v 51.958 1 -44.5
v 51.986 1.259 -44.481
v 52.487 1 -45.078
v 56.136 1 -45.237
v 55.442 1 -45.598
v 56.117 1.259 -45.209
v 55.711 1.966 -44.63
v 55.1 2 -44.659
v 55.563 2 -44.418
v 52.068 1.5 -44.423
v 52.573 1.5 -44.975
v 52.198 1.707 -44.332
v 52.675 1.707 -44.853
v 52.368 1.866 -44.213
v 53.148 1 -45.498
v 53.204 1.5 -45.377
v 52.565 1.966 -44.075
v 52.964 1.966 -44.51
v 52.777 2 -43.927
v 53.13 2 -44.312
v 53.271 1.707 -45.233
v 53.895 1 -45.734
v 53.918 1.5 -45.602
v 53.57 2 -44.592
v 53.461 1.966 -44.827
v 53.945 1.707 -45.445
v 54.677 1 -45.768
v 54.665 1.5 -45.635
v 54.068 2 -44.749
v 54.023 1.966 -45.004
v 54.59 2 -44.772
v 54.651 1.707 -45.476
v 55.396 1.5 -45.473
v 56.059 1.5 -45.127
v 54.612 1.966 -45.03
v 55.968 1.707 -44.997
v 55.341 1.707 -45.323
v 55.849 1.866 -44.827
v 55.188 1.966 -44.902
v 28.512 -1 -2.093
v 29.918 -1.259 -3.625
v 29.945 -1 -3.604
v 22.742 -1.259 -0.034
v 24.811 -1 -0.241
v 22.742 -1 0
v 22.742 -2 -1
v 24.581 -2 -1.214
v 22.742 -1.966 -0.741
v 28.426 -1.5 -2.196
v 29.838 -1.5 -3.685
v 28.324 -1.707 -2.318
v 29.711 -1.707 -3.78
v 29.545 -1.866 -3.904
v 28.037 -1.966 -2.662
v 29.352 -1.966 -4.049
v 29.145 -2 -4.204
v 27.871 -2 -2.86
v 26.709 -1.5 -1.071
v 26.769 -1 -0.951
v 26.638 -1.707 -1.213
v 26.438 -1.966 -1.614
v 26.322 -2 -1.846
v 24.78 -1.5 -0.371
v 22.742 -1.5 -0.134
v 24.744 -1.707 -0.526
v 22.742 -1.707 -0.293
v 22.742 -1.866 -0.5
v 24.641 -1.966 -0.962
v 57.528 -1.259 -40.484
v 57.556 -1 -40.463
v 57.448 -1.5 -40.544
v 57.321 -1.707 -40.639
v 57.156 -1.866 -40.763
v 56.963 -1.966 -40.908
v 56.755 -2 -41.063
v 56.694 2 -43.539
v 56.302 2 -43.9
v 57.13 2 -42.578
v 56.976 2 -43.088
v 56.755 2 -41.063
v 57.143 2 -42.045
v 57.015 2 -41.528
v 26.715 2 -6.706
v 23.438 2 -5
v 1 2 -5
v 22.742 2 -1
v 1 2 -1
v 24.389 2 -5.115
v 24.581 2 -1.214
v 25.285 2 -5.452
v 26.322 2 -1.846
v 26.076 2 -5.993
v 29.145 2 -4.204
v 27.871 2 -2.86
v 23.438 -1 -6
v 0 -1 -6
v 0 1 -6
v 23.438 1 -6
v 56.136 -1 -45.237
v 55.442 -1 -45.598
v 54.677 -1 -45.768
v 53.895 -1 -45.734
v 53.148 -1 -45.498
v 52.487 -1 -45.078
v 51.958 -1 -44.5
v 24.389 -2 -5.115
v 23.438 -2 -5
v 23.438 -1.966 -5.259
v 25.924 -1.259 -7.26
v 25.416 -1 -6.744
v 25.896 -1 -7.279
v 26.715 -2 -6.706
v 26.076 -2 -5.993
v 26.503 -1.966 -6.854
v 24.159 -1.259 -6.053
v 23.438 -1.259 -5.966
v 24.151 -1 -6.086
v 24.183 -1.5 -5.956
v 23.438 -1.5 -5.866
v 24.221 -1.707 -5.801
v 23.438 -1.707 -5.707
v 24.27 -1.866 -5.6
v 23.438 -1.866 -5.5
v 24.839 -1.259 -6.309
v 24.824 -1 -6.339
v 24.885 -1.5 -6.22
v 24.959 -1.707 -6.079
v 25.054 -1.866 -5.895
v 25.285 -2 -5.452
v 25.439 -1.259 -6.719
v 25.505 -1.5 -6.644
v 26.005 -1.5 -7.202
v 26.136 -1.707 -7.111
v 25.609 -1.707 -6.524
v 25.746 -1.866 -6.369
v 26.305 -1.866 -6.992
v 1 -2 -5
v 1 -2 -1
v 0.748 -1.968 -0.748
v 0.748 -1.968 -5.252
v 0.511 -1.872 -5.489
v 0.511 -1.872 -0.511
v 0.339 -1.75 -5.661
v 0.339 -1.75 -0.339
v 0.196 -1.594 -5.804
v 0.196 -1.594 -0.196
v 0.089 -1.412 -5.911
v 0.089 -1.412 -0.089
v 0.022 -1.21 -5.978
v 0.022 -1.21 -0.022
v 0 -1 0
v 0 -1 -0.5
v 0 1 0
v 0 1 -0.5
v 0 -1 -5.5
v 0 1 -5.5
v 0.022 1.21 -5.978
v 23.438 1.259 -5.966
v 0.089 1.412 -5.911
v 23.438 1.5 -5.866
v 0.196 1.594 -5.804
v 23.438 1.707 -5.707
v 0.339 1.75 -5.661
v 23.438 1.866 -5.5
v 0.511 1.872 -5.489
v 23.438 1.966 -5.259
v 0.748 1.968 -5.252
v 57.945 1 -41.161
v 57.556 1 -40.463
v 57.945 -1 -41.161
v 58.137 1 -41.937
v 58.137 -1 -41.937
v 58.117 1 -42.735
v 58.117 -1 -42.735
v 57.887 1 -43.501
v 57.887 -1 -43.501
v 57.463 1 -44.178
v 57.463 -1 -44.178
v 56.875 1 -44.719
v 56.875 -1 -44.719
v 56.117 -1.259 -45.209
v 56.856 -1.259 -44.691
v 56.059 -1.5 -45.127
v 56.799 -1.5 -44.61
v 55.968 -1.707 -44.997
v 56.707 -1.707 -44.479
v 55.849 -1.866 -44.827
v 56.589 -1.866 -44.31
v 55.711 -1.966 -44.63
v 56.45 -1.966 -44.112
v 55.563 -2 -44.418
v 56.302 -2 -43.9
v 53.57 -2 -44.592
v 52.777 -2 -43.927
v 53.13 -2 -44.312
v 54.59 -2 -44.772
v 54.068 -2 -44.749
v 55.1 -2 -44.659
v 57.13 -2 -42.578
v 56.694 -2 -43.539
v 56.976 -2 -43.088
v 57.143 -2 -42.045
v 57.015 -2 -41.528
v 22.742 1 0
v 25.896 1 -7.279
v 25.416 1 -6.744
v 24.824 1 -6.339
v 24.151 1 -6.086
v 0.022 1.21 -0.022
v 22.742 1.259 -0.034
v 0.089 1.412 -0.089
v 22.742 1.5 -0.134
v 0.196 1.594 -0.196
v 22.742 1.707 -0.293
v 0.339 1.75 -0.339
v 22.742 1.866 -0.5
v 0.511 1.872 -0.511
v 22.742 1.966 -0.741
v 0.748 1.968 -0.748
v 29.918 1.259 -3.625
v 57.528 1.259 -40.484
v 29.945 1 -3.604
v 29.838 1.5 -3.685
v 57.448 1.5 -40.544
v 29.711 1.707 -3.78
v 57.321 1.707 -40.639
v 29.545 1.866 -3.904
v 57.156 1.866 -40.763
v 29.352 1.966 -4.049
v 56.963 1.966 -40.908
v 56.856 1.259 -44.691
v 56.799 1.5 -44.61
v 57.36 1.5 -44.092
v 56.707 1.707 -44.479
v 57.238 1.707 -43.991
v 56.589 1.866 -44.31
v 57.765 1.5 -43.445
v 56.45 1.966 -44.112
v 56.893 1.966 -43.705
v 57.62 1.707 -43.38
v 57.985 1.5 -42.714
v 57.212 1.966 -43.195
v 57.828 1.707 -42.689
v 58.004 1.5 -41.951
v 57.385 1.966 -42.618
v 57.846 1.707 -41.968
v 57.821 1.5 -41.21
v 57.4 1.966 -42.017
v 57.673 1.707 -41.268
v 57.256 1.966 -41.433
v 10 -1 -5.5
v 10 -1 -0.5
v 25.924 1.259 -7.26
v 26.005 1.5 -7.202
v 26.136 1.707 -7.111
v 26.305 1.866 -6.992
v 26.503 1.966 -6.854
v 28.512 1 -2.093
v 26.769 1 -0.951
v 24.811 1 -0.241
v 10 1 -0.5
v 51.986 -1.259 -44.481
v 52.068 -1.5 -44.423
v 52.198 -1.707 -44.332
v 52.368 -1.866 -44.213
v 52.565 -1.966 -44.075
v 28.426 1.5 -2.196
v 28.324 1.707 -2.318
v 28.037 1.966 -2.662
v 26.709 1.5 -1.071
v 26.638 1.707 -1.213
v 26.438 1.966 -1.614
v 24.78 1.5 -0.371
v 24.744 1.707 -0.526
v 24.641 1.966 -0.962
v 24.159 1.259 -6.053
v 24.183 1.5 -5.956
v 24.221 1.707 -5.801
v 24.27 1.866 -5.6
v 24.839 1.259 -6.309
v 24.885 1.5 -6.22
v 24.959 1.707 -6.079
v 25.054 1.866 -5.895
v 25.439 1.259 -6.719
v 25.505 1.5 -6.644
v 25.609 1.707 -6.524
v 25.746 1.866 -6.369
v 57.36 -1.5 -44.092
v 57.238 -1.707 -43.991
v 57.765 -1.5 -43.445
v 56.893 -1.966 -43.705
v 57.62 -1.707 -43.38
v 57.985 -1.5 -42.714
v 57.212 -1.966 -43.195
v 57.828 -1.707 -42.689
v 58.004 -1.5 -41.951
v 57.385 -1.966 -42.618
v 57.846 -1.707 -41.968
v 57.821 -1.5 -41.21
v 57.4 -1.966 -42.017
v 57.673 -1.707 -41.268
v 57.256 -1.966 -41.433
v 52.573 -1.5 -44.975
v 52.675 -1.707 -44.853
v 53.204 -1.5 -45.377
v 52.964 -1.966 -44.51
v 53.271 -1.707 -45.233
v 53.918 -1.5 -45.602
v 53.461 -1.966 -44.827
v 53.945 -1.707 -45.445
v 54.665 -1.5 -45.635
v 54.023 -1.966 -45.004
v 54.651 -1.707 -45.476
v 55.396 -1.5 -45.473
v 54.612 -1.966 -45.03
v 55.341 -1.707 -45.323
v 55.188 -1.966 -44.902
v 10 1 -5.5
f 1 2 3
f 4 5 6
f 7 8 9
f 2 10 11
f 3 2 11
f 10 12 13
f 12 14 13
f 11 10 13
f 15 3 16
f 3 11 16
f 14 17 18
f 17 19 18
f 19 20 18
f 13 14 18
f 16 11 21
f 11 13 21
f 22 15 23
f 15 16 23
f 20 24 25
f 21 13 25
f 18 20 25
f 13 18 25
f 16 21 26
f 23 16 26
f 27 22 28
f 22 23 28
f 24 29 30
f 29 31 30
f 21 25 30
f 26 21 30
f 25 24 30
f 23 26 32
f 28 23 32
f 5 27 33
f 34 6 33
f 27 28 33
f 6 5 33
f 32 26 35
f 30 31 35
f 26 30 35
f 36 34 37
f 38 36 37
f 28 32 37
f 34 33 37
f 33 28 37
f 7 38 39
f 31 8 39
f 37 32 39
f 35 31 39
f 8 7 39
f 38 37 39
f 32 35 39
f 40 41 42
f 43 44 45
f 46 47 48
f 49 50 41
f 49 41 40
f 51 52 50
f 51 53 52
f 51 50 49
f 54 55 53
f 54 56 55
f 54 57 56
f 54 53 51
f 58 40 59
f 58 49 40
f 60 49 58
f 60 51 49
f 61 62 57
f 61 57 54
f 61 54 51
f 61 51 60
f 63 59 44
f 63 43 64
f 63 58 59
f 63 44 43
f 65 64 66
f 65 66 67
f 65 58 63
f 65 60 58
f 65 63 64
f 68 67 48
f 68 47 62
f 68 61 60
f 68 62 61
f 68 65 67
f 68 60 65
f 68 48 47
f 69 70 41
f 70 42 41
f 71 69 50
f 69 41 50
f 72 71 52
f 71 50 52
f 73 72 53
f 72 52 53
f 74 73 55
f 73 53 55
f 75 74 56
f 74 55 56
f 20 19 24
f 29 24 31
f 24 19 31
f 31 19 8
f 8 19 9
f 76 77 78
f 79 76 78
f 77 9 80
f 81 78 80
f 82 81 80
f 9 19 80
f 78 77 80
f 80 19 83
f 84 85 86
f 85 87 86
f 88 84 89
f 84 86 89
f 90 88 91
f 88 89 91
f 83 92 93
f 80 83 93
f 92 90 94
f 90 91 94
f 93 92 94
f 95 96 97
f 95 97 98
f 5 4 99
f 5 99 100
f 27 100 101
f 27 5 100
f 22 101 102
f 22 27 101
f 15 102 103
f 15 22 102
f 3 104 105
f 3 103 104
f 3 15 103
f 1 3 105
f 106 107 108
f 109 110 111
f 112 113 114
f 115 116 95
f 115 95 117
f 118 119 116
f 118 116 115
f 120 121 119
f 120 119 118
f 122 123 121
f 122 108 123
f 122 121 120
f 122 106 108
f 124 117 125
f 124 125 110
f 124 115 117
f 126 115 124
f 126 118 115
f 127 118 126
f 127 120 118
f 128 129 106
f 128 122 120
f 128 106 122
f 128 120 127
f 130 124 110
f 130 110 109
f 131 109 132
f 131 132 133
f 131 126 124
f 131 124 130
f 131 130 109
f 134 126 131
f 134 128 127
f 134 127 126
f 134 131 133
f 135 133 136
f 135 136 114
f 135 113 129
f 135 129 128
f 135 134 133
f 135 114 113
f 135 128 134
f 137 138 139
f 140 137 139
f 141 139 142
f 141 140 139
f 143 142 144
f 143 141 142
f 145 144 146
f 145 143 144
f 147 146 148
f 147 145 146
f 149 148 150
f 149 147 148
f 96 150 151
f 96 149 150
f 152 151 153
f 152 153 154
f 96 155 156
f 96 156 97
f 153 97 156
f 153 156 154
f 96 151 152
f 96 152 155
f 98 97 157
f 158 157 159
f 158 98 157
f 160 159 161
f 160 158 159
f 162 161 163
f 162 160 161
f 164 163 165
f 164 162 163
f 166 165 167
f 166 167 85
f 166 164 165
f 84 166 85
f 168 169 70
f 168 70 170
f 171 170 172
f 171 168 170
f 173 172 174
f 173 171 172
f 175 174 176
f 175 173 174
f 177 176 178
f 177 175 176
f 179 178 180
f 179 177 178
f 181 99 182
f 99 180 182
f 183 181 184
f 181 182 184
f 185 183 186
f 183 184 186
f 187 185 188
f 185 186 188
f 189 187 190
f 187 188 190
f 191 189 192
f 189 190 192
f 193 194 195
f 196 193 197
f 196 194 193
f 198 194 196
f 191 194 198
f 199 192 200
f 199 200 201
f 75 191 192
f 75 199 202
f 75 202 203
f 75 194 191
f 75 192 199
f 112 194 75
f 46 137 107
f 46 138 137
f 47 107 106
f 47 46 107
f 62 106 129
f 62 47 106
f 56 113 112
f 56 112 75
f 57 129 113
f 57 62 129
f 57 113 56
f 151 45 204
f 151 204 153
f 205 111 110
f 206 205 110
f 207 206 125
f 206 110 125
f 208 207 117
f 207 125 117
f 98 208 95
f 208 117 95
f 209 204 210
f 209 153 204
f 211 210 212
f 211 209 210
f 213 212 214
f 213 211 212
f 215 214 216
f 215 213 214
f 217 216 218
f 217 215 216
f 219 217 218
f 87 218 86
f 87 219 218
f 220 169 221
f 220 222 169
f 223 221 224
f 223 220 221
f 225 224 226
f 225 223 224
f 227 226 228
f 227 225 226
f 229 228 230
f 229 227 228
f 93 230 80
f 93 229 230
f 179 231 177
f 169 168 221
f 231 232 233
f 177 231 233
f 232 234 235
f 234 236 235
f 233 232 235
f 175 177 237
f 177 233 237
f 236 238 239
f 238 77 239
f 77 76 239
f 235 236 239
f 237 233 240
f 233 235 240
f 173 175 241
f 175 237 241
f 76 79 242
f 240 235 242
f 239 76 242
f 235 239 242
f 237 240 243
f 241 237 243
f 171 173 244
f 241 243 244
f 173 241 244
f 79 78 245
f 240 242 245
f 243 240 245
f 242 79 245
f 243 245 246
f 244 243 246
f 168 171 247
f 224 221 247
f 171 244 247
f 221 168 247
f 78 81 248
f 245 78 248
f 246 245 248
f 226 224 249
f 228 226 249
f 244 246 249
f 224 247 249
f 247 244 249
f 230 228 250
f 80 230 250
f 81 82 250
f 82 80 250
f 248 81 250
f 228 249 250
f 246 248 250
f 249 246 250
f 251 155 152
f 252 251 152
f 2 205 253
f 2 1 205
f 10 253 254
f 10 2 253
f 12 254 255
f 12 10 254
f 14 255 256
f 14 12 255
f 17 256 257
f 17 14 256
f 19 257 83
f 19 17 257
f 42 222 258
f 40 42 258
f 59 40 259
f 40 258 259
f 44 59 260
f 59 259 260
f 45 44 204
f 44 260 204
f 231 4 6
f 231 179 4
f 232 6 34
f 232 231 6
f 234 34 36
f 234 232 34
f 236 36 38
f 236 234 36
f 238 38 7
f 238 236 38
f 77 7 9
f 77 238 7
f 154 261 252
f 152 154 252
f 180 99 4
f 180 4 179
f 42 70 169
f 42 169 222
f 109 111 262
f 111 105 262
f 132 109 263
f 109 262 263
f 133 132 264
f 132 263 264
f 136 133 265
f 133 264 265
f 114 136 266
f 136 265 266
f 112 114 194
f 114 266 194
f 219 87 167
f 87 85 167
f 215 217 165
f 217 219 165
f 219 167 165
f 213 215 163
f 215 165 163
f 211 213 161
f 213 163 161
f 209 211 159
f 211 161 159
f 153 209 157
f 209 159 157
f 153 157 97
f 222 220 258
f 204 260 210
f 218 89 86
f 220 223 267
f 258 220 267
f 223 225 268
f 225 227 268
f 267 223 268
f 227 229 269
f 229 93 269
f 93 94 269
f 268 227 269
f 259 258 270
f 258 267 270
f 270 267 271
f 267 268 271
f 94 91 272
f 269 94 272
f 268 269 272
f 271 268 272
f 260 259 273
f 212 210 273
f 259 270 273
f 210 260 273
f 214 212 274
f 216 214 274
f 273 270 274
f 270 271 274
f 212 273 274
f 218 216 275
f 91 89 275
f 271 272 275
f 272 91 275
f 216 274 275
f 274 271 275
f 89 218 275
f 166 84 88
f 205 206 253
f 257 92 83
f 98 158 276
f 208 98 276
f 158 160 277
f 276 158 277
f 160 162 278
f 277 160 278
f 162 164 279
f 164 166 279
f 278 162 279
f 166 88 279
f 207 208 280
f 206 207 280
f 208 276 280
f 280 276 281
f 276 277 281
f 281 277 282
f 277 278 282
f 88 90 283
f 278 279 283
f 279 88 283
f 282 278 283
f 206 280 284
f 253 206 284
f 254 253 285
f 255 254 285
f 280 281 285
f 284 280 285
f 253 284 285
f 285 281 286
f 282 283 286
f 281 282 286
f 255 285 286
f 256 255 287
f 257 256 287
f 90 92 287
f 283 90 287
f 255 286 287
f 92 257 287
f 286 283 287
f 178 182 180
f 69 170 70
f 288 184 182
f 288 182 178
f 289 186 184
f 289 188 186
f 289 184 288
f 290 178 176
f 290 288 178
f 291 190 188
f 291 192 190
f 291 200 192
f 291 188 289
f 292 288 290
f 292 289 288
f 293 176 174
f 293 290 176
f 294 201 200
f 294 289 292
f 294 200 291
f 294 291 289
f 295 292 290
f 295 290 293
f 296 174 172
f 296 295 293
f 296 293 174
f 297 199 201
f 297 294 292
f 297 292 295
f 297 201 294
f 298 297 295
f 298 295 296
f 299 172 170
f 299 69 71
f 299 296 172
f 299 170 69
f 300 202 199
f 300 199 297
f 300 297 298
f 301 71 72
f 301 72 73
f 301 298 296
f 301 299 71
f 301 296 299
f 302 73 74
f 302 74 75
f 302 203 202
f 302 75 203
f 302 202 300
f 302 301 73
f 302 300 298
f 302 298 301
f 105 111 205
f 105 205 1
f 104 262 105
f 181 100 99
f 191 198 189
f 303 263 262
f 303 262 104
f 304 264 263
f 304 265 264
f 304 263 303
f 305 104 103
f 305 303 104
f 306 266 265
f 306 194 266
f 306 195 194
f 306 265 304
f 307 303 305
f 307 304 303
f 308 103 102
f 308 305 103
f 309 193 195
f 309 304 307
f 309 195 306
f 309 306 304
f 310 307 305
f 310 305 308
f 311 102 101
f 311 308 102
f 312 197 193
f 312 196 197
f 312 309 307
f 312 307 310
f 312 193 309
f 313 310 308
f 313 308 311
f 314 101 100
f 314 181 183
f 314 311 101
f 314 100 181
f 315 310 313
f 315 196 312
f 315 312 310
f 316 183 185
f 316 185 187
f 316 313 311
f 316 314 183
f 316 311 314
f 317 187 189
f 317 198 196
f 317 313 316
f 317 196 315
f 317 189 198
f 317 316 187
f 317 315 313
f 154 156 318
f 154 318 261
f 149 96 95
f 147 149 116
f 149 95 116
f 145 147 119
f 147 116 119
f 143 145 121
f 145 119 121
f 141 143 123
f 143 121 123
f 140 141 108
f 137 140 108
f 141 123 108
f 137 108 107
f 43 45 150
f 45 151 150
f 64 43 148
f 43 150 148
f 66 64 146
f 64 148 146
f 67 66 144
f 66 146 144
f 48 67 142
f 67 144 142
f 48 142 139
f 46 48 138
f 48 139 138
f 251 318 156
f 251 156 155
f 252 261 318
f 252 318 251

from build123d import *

# Parameters (mm, degrees)
F1_DEPTH = 2
F2_R     = 3
F3_R     = 9
F4_W     = 2
F4_H     = 5
F5_DEPTH = 10
F6_R     = 0.99999


# Not quite as in the source:
# - a fillet or chamfer is up to 0.001 mm smaller than in the source, because OpenCascade refuses the exact size


with BuildPart() as f1:
    # F0 (on Front) → F1 (new body, symmetric)
    with BuildSketch(Plane.XZ):
        Polygon((27.2452607751, 0), (0, 0), (0, -6), (25, -6), (53.6788218176, -46.9576022144), (59.4128861276, -42.94256716), align=None)
    extrude(amount=F1_DEPTH, both=True)

    # F2
    f2_edges = [f1.edges().sort_by_distance(p)[0] for p in [
        (25, 0, -6),
        (53.678822, 0, -46.957602),
        (59.412886, 0, -42.942567),
    ]]
    fillet(f2_edges, radius=F2_R)

    # F3
    f3_edges = [f1.edges().sort_by_distance(p)[0] for p in [
        (27.245261, 0, 0),
    ]]
    fillet(f3_edges, radius=F3_R)

    # F4 (on face) → F5 (cut)
    with BuildSketch(Plane(origin=(0, 0, 0), x_dir=(0, -1, 0), z_dir=(-1, 0, 0))):
        with Locations((0, -3)):
            Rectangle(F4_W, F4_H)
    extrude(amount=-F5_DEPTH, mode=Mode.SUBTRACT)

    # F6 (radius 1 in the source; OpenCascade refuses exactly that, so slightly less here)
    f6_edges = [f1.edges().sort_by_distance(p)[0] for p in [
        (43.750416, -2, -22.03376),
        (26.769245, -2, -0.951335),
        (58.117041, -2, -42.735428),
        (11.370982, -2, 0),
        (56.505829, -2, -44.978111),
        (0, -2, -3),
        (53.894604, -2, -45.73384),
        (11.719149, -2, -6),
        (38.926924, -2, -25.889708),
        (24.823545, -2, -6.338968),
        (43.750416, 2, -22.03376),
        (26.769245, 2, -0.951335),
        (58.117041, 2, -42.735428),
        (11.370982, 2, 0),
        (56.505829, 2, -44.978111),
        (0, 2, -3),
        (53.894604, 2, -45.73384),
        (11.719149, 2, -6),
        (38.926924, 2, -25.889708),
        (24.823545, 2, -6.338968),
    ]]
    fillet(f6_edges, radius=F6_R)


solid = f1.part
